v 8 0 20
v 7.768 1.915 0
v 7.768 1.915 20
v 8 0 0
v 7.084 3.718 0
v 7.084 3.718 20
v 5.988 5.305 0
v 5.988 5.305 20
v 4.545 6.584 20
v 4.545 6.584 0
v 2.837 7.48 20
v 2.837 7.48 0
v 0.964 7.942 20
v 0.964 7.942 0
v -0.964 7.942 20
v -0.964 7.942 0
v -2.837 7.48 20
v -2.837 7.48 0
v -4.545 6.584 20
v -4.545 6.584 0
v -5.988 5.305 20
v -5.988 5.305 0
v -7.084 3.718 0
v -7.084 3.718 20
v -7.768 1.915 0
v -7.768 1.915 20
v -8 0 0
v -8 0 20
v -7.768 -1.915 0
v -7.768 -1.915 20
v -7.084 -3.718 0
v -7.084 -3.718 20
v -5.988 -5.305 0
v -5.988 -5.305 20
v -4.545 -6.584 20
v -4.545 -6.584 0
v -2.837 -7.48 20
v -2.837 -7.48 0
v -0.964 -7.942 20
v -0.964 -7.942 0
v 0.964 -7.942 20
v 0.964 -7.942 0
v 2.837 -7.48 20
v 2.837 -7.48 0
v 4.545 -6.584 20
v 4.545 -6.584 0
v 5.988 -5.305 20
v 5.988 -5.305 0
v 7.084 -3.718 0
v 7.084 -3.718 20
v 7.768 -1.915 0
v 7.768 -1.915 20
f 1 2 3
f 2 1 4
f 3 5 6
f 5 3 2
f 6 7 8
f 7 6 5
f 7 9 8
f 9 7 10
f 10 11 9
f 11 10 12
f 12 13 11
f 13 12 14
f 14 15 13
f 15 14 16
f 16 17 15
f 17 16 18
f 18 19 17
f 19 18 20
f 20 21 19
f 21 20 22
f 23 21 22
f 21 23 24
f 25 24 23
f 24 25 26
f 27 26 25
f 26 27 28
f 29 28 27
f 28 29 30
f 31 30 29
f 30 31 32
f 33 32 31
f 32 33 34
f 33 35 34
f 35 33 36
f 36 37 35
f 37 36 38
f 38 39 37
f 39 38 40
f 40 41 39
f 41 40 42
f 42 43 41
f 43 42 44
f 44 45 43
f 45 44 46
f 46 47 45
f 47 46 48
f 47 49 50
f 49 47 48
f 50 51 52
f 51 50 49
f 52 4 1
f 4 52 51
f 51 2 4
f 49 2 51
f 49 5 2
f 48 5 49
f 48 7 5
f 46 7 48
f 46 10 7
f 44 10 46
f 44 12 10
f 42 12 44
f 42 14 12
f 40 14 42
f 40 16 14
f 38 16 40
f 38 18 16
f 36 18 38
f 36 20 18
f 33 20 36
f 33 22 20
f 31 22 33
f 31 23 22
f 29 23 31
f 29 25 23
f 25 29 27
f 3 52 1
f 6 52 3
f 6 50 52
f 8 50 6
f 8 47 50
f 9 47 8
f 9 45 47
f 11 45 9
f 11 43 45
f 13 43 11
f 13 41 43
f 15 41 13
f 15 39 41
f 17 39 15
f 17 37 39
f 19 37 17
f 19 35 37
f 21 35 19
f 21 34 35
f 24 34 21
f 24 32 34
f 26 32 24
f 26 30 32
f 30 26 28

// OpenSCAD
// Default fragment count comes from $fa/$fs (matches OpenSCAD's tessellation).
cylinder(h = 20, r = 8);
